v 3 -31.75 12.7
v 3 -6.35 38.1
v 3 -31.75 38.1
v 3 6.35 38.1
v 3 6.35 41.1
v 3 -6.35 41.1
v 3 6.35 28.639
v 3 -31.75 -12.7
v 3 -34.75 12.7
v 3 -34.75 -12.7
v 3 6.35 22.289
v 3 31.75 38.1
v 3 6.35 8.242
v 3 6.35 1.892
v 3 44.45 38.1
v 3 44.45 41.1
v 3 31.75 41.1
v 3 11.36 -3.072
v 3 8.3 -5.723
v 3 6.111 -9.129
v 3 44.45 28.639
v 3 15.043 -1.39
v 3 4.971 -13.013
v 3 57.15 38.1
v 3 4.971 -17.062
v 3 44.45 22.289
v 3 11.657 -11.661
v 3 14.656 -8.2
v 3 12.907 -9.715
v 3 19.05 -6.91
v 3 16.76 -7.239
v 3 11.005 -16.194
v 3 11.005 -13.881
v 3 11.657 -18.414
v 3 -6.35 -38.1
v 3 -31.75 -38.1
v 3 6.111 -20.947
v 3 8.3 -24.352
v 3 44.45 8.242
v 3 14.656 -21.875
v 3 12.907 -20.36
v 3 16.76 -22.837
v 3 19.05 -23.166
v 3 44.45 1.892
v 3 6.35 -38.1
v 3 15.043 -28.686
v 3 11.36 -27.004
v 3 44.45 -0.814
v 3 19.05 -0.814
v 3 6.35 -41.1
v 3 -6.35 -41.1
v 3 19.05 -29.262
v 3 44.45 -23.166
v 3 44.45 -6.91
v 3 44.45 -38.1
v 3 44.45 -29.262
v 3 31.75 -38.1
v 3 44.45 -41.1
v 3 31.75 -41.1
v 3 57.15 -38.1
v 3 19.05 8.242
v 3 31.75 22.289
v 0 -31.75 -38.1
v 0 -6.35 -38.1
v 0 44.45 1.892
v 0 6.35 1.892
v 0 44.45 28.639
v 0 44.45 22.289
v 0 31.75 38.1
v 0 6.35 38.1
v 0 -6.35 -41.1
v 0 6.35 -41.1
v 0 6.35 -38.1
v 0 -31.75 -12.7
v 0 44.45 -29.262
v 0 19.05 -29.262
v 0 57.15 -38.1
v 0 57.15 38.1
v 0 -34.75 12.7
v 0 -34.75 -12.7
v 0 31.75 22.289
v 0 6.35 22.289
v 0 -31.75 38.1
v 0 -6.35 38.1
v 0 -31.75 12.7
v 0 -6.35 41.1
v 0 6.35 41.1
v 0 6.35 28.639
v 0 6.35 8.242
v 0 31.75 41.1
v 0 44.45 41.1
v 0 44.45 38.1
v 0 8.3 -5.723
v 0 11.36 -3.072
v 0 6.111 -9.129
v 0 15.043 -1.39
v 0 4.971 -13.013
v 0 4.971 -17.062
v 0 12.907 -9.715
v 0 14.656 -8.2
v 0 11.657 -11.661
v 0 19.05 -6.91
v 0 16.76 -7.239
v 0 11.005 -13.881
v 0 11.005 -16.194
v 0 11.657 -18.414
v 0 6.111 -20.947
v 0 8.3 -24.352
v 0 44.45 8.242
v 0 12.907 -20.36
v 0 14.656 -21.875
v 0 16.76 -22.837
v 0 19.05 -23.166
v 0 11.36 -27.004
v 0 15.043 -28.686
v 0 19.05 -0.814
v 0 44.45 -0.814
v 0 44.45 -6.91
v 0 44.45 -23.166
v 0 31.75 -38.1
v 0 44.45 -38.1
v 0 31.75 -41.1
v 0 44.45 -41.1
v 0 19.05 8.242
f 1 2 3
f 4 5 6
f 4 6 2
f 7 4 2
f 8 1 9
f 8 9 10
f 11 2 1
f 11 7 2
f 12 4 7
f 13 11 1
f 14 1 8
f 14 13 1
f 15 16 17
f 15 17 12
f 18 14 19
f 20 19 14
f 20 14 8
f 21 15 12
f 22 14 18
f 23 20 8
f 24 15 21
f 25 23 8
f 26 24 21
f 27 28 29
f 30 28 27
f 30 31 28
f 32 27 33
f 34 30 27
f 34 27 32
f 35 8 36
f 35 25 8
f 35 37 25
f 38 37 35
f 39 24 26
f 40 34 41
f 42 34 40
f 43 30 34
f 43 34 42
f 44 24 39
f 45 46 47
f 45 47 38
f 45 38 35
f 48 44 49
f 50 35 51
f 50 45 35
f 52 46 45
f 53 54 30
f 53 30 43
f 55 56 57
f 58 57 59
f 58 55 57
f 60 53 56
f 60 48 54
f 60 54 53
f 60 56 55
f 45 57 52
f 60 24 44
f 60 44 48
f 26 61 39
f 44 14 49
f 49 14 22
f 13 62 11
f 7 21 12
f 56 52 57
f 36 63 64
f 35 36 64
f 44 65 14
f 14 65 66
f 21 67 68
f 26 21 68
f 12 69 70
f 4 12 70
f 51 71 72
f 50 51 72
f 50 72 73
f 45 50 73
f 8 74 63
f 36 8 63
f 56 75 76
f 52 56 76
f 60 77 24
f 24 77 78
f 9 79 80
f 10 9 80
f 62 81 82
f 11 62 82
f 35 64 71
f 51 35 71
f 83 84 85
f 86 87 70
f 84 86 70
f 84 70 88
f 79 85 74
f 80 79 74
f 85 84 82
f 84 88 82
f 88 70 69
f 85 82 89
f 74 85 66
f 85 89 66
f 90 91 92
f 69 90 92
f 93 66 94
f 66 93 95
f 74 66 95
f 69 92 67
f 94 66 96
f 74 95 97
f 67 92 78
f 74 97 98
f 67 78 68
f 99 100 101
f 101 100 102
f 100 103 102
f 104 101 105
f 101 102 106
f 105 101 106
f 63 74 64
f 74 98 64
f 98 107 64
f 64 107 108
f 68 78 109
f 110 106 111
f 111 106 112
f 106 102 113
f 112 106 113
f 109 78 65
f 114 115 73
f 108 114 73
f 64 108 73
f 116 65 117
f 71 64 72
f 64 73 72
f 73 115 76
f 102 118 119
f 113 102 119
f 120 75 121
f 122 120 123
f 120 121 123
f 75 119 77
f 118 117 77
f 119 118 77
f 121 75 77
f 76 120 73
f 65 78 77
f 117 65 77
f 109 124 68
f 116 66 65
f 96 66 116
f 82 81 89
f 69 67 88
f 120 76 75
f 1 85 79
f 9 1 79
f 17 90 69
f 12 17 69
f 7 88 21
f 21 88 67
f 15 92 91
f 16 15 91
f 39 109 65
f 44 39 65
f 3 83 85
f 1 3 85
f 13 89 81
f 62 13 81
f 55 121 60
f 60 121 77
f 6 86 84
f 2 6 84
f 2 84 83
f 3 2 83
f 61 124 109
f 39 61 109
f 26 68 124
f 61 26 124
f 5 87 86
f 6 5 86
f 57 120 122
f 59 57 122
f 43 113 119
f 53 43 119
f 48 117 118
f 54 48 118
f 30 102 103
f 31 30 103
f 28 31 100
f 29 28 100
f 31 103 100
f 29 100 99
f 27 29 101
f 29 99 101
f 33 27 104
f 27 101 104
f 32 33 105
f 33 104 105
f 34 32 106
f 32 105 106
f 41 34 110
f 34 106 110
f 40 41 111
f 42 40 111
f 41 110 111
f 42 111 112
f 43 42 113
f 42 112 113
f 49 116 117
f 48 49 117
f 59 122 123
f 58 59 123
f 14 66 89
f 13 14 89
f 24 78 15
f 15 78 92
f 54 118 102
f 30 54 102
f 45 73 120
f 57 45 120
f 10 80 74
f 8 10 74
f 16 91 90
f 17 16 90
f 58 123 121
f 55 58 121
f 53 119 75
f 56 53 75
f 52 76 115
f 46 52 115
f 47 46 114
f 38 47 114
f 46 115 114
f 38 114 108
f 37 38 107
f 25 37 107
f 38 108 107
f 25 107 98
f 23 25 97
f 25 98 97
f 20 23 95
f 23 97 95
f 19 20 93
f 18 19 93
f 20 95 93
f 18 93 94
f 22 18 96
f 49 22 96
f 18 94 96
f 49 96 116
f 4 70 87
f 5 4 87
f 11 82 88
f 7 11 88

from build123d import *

# Parameters (mm, degrees)
BOSS_EXTRUDE1_DEPTH = 3


with BuildPart() as part:
    # Sketch1 → Boss-Extrude1 (new body)
    with BuildSketch(Plane(origin=(0, 0, 0), x_dir=(0, 0, -1), z_dir=(1, 0, 0))):
        Polygon((-38.1, -17.2847), (-38.1, -20.8153), (-38.1, -31.75), (-12.7, -31.75), (-12.7, -34.75), (12.7, -34.75), (12.7, -31.75), (38.1, -31.75), (38.1, -20.8153), (38.1, -17.2847), (38.1, -6.35), (41.1, -6.35), (41.1, 6.35), (38.1, 6.35), (38.1, 31.75), (41.1, 31.75), (41.1, 44.45), (38.1, 44.45), (38.1, 57.15), (-38.1, 57.15), (-38.1, 44.45), (-41.1, 44.45), (-41.1, 31.75), (-38.1, 31.75), (-38.1, 6.35), (-41.1, 6.35), (-41.1, -6.35), (-38.1, -6.35), align=None)
        Polygon((-22.288981843, 44.45), (-8.242290985, 19.05), (-8.242290985, 44.45), (-1.892290985, 44.45), (-1.892290985, 6.35), (-8.242290985, 6.35), (-22.288981843, 31.75), (-22.288981843, 6.35), (-28.638981843, 6.35), (-28.638981843, 44.45), align=None, mode=Mode.SUBTRACT)
        with BuildLine():
            Line((23.165757053, 44.45), (29.261757053, 44.45))
            Line((29.261757053, 44.45), (29.261757053, 19.05))
            ThreePointArc((29.261757053, 19.05), (15.037757053, 4.826), (0.813757053, 19.05))
            Line((0.813757053, 19.05), (0.813757053, 44.45))
            Line((0.813757053, 44.45), (6.909757053, 44.45))
            Line((6.909757053, 44.45), (6.909757053, 19.05))
            ThreePointArc((6.909757053, 19.05), (15.037757053, 10.922), (23.165757053, 19.05))
            Line((23.165757053, 19.05), (23.165757053, 44.45))
        make_face(mode=Mode.SUBTRACT)
    extrude(amount=BOSS_EXTRUDE1_DEPTH)


solid = part.part
